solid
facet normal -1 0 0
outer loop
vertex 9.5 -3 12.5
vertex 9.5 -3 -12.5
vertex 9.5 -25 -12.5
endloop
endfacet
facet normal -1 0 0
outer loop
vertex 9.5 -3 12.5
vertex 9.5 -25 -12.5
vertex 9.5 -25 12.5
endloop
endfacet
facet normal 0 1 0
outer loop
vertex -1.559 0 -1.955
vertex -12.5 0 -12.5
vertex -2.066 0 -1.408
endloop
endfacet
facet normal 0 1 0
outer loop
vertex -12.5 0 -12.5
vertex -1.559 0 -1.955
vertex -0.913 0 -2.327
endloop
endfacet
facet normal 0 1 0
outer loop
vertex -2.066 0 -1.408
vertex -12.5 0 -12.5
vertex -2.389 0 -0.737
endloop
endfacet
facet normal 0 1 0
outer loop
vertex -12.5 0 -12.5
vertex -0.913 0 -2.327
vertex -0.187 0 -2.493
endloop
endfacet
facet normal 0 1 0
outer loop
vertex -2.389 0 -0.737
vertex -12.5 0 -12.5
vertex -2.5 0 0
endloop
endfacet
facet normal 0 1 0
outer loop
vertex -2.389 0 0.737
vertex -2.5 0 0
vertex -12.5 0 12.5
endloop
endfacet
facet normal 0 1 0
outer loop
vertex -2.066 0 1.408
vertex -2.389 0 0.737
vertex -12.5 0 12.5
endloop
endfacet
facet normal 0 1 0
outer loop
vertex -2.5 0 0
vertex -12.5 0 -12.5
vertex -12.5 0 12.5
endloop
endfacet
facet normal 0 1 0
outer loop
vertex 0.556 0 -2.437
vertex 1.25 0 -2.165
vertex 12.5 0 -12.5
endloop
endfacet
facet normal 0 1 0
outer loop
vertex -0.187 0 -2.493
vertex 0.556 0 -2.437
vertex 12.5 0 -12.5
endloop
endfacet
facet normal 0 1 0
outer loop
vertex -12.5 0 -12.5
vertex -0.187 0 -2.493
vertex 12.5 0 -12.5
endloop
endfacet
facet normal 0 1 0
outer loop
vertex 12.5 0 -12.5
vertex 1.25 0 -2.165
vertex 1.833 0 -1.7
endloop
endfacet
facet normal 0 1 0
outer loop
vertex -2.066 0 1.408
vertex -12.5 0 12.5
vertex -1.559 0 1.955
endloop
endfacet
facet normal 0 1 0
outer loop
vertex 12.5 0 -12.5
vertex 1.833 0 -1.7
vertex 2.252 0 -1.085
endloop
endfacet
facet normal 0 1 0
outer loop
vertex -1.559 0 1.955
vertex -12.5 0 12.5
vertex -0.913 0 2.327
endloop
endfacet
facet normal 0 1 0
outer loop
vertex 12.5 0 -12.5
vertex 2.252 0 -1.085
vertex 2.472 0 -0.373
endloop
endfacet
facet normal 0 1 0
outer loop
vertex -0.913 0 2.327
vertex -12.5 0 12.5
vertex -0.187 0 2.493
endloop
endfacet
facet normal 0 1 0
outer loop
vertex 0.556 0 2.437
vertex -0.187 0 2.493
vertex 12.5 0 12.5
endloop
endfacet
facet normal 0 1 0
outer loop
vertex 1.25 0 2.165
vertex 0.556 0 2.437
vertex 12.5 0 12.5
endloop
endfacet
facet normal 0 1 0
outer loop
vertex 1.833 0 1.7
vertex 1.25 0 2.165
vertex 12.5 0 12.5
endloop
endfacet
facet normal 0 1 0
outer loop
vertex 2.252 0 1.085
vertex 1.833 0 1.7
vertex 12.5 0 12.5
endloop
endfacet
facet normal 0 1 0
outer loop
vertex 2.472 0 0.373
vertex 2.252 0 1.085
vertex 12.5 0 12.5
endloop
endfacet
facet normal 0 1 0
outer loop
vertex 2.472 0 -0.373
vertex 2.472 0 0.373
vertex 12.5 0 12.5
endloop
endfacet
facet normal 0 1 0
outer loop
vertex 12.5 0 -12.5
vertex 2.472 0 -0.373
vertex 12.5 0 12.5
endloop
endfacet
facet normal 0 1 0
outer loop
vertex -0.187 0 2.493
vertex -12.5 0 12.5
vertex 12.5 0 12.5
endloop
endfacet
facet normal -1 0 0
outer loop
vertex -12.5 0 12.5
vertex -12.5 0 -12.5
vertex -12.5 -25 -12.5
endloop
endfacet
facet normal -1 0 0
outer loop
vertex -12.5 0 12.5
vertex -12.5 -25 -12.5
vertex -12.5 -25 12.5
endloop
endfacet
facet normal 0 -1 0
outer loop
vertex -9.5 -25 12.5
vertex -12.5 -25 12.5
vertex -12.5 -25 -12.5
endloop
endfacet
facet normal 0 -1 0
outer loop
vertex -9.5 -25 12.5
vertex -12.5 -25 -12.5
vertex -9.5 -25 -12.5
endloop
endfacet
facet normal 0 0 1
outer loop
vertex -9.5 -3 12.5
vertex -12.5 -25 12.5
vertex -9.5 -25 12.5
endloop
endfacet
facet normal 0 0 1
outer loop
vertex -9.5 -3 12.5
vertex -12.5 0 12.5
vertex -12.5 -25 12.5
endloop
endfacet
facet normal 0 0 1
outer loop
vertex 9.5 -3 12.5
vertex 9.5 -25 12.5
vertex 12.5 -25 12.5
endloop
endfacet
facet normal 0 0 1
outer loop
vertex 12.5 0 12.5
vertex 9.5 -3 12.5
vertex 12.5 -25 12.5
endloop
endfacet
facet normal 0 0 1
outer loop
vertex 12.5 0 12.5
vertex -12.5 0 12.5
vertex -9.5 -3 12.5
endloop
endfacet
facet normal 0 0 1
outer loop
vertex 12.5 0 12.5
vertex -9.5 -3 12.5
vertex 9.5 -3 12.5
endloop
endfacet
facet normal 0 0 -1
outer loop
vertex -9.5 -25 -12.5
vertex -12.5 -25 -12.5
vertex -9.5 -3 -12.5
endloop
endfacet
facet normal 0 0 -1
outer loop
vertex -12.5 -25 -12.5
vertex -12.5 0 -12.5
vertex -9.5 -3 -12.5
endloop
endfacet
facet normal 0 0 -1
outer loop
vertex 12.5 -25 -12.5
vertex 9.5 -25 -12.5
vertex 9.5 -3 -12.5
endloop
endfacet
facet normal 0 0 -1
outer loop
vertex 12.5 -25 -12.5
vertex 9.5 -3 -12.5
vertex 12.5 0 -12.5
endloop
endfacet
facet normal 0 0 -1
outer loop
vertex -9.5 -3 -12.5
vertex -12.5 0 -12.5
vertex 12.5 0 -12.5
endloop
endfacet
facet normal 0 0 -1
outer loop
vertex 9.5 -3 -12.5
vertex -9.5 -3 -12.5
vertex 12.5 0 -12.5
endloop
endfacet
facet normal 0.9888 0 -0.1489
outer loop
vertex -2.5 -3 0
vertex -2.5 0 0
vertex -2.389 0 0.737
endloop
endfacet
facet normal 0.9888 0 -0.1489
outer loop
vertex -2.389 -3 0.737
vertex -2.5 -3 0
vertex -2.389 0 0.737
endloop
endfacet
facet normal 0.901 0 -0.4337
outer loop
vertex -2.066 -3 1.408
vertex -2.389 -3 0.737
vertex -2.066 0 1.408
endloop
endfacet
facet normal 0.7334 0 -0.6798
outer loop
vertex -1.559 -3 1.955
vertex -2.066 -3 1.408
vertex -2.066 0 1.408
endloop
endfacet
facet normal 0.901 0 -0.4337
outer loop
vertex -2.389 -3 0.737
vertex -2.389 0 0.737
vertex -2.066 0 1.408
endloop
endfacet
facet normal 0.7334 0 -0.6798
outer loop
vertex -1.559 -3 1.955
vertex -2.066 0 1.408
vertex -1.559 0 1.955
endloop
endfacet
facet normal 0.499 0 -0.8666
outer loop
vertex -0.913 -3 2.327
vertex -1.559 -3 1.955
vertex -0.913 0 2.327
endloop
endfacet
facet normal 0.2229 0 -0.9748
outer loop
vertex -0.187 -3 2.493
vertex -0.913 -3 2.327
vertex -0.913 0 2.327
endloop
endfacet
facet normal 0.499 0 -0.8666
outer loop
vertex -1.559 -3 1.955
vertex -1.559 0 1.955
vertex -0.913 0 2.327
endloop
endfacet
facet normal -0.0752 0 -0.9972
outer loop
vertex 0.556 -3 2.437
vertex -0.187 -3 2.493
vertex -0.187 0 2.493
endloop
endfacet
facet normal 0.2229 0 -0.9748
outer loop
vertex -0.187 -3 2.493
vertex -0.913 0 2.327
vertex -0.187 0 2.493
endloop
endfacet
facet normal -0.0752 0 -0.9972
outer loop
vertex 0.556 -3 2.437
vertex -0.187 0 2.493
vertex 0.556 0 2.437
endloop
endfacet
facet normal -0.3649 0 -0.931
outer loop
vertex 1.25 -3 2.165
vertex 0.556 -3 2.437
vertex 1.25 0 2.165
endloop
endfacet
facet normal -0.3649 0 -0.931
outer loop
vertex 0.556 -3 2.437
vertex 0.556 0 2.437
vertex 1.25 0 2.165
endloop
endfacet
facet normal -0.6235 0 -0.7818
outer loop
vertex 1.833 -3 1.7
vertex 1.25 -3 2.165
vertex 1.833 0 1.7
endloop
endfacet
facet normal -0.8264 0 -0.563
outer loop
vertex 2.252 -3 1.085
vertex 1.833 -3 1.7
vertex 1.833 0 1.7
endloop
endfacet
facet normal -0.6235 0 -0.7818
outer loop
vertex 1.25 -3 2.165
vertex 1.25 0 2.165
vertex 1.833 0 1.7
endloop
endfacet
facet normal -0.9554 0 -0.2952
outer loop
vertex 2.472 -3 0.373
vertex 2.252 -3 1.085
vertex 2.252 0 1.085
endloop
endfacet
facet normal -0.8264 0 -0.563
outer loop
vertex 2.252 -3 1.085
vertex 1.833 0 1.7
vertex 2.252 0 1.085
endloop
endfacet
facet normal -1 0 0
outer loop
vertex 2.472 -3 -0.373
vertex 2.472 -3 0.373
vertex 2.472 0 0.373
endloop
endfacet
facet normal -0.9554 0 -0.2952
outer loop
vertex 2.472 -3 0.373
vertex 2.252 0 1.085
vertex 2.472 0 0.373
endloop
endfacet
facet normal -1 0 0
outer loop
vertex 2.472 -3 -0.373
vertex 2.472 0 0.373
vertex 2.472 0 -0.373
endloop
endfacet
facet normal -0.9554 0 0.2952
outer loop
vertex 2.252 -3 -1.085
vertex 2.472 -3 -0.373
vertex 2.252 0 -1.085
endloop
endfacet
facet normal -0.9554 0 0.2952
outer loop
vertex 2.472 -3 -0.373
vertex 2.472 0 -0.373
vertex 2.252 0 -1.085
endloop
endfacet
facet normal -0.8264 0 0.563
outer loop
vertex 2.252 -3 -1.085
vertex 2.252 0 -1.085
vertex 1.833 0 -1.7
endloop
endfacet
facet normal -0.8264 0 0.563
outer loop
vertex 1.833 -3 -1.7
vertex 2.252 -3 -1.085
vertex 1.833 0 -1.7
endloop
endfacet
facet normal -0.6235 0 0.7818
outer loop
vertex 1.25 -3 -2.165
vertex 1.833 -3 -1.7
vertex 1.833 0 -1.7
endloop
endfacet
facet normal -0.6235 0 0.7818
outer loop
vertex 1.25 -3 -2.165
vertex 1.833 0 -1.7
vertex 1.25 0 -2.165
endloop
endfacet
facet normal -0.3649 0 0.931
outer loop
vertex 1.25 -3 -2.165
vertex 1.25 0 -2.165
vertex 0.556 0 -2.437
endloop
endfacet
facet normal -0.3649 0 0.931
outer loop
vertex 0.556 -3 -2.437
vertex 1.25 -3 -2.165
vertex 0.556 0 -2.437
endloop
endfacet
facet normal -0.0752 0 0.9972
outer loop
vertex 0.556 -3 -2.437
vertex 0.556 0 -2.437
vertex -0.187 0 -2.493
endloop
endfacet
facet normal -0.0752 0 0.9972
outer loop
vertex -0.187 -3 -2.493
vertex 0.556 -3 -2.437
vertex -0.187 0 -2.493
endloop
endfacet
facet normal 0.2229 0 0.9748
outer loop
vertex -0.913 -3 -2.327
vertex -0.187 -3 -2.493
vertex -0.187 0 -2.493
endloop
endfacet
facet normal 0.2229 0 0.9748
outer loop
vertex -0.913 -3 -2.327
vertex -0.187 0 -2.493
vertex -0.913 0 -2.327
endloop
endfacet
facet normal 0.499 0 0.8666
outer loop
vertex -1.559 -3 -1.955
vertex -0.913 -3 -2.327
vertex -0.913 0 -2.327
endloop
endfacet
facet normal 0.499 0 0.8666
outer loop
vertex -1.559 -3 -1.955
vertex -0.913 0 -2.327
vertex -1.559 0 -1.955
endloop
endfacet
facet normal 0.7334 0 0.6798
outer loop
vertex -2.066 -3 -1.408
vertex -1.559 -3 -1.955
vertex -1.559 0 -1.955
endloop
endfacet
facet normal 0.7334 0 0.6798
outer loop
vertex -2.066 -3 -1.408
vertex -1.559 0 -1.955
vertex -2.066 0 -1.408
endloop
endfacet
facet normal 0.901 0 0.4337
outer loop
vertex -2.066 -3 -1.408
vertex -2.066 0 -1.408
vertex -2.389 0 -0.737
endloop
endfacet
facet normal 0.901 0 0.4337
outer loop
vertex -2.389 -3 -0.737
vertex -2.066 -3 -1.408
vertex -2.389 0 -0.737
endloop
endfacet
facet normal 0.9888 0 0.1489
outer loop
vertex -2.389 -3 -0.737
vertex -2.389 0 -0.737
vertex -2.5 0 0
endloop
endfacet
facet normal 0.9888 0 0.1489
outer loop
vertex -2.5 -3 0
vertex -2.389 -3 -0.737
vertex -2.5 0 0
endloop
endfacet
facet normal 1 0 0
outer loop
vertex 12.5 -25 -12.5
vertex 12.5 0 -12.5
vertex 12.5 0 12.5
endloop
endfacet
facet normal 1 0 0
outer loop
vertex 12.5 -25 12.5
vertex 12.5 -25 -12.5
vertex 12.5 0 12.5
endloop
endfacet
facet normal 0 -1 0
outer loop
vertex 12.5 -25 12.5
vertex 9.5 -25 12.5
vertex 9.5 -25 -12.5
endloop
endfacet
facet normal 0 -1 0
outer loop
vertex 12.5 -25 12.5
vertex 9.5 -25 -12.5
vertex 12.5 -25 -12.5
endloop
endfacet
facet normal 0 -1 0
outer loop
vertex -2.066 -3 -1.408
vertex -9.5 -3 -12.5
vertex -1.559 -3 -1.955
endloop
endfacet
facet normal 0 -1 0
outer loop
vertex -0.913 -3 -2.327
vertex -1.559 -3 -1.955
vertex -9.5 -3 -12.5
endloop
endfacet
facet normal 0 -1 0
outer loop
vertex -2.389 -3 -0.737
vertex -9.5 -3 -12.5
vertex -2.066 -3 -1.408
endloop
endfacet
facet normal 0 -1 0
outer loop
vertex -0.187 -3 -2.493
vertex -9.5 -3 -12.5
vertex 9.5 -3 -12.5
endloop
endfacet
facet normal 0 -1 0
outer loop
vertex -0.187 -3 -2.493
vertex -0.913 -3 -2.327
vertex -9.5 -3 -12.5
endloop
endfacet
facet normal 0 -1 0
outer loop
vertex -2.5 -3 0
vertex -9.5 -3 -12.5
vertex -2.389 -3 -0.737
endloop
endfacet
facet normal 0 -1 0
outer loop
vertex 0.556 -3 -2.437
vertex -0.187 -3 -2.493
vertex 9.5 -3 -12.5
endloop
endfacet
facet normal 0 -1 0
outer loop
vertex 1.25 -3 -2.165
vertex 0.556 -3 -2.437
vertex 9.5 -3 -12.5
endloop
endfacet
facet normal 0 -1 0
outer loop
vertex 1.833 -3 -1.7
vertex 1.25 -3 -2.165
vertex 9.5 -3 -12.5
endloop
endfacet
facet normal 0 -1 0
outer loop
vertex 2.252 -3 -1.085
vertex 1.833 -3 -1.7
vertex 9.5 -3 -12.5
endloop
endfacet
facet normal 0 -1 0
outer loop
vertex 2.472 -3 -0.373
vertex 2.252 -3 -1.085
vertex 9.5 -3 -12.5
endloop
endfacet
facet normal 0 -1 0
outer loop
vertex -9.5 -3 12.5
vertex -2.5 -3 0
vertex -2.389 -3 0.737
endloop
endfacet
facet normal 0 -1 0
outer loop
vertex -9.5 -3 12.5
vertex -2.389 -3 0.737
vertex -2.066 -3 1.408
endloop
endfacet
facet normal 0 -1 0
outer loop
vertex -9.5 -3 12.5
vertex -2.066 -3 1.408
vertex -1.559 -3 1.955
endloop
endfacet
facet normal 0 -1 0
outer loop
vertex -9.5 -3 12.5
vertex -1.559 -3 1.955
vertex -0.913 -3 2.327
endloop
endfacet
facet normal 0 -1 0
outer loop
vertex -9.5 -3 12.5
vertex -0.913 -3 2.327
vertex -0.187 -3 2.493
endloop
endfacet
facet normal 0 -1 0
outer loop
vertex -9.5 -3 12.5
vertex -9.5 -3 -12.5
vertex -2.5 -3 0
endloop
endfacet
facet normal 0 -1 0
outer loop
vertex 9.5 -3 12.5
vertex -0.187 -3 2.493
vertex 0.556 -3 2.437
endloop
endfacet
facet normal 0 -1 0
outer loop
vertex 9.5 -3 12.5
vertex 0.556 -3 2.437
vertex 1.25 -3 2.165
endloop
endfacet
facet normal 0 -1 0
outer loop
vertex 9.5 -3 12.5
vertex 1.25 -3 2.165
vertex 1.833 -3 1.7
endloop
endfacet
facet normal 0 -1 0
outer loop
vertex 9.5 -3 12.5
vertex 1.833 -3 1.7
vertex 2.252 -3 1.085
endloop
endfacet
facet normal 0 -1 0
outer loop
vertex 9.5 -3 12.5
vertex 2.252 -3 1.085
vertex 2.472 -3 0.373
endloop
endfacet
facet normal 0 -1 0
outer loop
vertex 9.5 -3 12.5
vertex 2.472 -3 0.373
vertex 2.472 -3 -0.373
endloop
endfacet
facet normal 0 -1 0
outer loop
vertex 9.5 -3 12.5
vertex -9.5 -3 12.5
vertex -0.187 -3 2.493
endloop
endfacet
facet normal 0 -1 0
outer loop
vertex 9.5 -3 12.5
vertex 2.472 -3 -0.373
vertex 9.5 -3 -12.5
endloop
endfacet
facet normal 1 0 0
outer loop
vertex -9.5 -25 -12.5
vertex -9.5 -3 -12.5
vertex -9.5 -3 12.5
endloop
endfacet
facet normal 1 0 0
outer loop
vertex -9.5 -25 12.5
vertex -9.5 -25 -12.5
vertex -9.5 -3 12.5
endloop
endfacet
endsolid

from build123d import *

# Parameters (mm, degrees)
F0_W     = 25
F0_H     = 25
F1_DEPTH = 25
F2_T     = -3
F4_D     = 5
F4_DEPTH = 12
F4_TIP   = 1.5021515476


with BuildPart() as f1:
    # F0 (on Front) → F1 (new body)
    with BuildSketch(Plane.XZ):
        Rectangle(F0_W, F0_H)
    extrude(amount=F1_DEPTH)

    # F2
    f2_openings = [f1.faces().sort_by_distance(p)[0] for p in [
        (0, -25, 0),
        (0, -12.5, -12.5),
        (0, -12.5, 12.5),
    ]]
    offset(amount=F2_T, openings=f2_openings)

    # F4
    with Locations(Plane.XZ.offset(3)):
        with Locations((0, 0)):
            Hole(F4_D / 2, depth=F4_DEPTH)
            with Locations((0, 0, -(F4_DEPTH + F4_TIP / 2))):  # 118° drill point
                Cone(0, F4_D / 2, F4_TIP, mode=Mode.SUBTRACT)


solid = f1.part
